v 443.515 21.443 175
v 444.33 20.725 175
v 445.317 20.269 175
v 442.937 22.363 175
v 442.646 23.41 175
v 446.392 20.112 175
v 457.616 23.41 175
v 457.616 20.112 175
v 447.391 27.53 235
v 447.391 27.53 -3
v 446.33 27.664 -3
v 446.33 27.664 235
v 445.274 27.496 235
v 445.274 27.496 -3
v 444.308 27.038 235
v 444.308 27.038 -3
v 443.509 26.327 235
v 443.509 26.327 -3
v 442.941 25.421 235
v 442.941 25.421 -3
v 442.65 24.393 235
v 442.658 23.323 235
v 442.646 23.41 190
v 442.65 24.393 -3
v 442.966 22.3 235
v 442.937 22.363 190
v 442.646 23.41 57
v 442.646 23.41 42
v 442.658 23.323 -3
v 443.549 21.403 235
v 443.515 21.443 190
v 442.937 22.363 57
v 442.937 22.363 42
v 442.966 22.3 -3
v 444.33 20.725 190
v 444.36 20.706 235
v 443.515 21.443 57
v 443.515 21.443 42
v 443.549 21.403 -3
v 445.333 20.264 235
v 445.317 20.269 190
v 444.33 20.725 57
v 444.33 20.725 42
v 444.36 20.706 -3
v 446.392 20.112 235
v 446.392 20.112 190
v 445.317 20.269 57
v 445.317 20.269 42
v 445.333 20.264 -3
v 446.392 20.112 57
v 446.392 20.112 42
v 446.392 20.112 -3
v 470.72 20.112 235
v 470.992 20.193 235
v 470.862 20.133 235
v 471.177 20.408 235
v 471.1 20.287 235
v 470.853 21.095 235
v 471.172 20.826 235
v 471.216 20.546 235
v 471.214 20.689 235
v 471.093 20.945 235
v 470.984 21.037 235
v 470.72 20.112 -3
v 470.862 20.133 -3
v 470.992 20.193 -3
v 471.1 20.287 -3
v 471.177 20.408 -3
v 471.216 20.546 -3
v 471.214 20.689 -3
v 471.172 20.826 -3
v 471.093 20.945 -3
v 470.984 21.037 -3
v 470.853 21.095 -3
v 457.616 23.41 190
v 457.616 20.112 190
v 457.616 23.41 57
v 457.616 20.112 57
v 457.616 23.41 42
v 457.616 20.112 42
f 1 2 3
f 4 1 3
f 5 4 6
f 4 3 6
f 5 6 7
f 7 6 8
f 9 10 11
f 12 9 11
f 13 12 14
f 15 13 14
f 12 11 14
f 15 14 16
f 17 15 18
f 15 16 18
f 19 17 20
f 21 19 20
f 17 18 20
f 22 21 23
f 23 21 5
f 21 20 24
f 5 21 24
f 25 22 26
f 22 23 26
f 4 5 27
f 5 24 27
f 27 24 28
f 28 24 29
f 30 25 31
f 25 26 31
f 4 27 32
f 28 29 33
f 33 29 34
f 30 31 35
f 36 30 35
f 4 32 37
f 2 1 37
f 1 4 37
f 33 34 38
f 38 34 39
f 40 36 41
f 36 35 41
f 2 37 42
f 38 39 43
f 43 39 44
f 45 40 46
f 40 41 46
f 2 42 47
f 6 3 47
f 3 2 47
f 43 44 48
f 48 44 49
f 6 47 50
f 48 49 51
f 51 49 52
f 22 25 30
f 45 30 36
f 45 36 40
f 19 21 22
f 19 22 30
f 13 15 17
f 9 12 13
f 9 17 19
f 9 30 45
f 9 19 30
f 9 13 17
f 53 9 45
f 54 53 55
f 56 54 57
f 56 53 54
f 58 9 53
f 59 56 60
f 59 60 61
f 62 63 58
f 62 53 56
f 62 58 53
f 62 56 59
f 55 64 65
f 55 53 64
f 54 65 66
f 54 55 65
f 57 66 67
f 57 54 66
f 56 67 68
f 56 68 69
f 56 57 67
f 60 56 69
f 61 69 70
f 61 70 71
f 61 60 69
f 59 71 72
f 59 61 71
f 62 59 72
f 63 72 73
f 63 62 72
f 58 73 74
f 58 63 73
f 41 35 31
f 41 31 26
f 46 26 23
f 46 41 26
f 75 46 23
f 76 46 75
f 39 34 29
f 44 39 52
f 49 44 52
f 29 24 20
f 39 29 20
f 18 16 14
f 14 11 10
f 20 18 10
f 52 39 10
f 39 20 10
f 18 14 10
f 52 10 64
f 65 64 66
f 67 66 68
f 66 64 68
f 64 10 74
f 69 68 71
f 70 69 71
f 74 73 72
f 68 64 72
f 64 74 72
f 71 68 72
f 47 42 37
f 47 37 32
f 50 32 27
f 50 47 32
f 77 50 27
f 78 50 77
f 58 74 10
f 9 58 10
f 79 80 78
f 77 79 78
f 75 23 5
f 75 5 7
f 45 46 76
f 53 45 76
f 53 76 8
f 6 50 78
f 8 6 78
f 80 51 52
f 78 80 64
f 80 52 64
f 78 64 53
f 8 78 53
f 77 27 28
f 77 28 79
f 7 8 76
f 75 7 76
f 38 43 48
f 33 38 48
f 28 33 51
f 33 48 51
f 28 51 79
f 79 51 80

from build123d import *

# Parameters (mm, degrees)
BOSS_EXTRUDE1_DEPTH = 238
SKETCH3_W           = 15
SKETCH3_H           = 15
CUT_EXTRUDE1_DEPTH  = 54
FILLET1_R           = 0.5


with BuildPart() as part:
    # Sketch2 → Boss-Extrude1 (new body)
    with BuildSketch(Plane.XY.offset(-3)):
        with BuildLine():
            Line((446.391965645, 20.11245238), (474.43313548, 20.11245238))
            Line((474.43313548, 20.11245238), (447.390900992, 27.530319971))
            ThreePointArc((447.390900992, 27.530319971), (442.649552271, 24.39262378), (446.391965645, 20.11245238))
        make_face()
    extrude(amount=BOSS_EXTRUDE1_DEPTH)

    # Sketch3 → Cut-Extrude1 (cut)
    with BuildSketch(Plane.XZ.offset(30.589717262)):
        with Locations((450.115770482, 182.5)):
            Rectangle(SKETCH3_W, SKETCH3_H)
        with Locations((450.115770482, 49.5)):
            Rectangle(SKETCH3_W, SKETCH3_H)
    extrude(amount=-CUT_EXTRUDE1_DEPTH, mode=Mode.SUBTRACT)

    # Fillet1
    fillet1_edges = [part.edges().sort_by_distance(p)[0] for p in [
        (474.43313548, 20.11245238, 116),
    ]]
    fillet(fillet1_edges, radius=FILLET1_R)


solid = part.part
